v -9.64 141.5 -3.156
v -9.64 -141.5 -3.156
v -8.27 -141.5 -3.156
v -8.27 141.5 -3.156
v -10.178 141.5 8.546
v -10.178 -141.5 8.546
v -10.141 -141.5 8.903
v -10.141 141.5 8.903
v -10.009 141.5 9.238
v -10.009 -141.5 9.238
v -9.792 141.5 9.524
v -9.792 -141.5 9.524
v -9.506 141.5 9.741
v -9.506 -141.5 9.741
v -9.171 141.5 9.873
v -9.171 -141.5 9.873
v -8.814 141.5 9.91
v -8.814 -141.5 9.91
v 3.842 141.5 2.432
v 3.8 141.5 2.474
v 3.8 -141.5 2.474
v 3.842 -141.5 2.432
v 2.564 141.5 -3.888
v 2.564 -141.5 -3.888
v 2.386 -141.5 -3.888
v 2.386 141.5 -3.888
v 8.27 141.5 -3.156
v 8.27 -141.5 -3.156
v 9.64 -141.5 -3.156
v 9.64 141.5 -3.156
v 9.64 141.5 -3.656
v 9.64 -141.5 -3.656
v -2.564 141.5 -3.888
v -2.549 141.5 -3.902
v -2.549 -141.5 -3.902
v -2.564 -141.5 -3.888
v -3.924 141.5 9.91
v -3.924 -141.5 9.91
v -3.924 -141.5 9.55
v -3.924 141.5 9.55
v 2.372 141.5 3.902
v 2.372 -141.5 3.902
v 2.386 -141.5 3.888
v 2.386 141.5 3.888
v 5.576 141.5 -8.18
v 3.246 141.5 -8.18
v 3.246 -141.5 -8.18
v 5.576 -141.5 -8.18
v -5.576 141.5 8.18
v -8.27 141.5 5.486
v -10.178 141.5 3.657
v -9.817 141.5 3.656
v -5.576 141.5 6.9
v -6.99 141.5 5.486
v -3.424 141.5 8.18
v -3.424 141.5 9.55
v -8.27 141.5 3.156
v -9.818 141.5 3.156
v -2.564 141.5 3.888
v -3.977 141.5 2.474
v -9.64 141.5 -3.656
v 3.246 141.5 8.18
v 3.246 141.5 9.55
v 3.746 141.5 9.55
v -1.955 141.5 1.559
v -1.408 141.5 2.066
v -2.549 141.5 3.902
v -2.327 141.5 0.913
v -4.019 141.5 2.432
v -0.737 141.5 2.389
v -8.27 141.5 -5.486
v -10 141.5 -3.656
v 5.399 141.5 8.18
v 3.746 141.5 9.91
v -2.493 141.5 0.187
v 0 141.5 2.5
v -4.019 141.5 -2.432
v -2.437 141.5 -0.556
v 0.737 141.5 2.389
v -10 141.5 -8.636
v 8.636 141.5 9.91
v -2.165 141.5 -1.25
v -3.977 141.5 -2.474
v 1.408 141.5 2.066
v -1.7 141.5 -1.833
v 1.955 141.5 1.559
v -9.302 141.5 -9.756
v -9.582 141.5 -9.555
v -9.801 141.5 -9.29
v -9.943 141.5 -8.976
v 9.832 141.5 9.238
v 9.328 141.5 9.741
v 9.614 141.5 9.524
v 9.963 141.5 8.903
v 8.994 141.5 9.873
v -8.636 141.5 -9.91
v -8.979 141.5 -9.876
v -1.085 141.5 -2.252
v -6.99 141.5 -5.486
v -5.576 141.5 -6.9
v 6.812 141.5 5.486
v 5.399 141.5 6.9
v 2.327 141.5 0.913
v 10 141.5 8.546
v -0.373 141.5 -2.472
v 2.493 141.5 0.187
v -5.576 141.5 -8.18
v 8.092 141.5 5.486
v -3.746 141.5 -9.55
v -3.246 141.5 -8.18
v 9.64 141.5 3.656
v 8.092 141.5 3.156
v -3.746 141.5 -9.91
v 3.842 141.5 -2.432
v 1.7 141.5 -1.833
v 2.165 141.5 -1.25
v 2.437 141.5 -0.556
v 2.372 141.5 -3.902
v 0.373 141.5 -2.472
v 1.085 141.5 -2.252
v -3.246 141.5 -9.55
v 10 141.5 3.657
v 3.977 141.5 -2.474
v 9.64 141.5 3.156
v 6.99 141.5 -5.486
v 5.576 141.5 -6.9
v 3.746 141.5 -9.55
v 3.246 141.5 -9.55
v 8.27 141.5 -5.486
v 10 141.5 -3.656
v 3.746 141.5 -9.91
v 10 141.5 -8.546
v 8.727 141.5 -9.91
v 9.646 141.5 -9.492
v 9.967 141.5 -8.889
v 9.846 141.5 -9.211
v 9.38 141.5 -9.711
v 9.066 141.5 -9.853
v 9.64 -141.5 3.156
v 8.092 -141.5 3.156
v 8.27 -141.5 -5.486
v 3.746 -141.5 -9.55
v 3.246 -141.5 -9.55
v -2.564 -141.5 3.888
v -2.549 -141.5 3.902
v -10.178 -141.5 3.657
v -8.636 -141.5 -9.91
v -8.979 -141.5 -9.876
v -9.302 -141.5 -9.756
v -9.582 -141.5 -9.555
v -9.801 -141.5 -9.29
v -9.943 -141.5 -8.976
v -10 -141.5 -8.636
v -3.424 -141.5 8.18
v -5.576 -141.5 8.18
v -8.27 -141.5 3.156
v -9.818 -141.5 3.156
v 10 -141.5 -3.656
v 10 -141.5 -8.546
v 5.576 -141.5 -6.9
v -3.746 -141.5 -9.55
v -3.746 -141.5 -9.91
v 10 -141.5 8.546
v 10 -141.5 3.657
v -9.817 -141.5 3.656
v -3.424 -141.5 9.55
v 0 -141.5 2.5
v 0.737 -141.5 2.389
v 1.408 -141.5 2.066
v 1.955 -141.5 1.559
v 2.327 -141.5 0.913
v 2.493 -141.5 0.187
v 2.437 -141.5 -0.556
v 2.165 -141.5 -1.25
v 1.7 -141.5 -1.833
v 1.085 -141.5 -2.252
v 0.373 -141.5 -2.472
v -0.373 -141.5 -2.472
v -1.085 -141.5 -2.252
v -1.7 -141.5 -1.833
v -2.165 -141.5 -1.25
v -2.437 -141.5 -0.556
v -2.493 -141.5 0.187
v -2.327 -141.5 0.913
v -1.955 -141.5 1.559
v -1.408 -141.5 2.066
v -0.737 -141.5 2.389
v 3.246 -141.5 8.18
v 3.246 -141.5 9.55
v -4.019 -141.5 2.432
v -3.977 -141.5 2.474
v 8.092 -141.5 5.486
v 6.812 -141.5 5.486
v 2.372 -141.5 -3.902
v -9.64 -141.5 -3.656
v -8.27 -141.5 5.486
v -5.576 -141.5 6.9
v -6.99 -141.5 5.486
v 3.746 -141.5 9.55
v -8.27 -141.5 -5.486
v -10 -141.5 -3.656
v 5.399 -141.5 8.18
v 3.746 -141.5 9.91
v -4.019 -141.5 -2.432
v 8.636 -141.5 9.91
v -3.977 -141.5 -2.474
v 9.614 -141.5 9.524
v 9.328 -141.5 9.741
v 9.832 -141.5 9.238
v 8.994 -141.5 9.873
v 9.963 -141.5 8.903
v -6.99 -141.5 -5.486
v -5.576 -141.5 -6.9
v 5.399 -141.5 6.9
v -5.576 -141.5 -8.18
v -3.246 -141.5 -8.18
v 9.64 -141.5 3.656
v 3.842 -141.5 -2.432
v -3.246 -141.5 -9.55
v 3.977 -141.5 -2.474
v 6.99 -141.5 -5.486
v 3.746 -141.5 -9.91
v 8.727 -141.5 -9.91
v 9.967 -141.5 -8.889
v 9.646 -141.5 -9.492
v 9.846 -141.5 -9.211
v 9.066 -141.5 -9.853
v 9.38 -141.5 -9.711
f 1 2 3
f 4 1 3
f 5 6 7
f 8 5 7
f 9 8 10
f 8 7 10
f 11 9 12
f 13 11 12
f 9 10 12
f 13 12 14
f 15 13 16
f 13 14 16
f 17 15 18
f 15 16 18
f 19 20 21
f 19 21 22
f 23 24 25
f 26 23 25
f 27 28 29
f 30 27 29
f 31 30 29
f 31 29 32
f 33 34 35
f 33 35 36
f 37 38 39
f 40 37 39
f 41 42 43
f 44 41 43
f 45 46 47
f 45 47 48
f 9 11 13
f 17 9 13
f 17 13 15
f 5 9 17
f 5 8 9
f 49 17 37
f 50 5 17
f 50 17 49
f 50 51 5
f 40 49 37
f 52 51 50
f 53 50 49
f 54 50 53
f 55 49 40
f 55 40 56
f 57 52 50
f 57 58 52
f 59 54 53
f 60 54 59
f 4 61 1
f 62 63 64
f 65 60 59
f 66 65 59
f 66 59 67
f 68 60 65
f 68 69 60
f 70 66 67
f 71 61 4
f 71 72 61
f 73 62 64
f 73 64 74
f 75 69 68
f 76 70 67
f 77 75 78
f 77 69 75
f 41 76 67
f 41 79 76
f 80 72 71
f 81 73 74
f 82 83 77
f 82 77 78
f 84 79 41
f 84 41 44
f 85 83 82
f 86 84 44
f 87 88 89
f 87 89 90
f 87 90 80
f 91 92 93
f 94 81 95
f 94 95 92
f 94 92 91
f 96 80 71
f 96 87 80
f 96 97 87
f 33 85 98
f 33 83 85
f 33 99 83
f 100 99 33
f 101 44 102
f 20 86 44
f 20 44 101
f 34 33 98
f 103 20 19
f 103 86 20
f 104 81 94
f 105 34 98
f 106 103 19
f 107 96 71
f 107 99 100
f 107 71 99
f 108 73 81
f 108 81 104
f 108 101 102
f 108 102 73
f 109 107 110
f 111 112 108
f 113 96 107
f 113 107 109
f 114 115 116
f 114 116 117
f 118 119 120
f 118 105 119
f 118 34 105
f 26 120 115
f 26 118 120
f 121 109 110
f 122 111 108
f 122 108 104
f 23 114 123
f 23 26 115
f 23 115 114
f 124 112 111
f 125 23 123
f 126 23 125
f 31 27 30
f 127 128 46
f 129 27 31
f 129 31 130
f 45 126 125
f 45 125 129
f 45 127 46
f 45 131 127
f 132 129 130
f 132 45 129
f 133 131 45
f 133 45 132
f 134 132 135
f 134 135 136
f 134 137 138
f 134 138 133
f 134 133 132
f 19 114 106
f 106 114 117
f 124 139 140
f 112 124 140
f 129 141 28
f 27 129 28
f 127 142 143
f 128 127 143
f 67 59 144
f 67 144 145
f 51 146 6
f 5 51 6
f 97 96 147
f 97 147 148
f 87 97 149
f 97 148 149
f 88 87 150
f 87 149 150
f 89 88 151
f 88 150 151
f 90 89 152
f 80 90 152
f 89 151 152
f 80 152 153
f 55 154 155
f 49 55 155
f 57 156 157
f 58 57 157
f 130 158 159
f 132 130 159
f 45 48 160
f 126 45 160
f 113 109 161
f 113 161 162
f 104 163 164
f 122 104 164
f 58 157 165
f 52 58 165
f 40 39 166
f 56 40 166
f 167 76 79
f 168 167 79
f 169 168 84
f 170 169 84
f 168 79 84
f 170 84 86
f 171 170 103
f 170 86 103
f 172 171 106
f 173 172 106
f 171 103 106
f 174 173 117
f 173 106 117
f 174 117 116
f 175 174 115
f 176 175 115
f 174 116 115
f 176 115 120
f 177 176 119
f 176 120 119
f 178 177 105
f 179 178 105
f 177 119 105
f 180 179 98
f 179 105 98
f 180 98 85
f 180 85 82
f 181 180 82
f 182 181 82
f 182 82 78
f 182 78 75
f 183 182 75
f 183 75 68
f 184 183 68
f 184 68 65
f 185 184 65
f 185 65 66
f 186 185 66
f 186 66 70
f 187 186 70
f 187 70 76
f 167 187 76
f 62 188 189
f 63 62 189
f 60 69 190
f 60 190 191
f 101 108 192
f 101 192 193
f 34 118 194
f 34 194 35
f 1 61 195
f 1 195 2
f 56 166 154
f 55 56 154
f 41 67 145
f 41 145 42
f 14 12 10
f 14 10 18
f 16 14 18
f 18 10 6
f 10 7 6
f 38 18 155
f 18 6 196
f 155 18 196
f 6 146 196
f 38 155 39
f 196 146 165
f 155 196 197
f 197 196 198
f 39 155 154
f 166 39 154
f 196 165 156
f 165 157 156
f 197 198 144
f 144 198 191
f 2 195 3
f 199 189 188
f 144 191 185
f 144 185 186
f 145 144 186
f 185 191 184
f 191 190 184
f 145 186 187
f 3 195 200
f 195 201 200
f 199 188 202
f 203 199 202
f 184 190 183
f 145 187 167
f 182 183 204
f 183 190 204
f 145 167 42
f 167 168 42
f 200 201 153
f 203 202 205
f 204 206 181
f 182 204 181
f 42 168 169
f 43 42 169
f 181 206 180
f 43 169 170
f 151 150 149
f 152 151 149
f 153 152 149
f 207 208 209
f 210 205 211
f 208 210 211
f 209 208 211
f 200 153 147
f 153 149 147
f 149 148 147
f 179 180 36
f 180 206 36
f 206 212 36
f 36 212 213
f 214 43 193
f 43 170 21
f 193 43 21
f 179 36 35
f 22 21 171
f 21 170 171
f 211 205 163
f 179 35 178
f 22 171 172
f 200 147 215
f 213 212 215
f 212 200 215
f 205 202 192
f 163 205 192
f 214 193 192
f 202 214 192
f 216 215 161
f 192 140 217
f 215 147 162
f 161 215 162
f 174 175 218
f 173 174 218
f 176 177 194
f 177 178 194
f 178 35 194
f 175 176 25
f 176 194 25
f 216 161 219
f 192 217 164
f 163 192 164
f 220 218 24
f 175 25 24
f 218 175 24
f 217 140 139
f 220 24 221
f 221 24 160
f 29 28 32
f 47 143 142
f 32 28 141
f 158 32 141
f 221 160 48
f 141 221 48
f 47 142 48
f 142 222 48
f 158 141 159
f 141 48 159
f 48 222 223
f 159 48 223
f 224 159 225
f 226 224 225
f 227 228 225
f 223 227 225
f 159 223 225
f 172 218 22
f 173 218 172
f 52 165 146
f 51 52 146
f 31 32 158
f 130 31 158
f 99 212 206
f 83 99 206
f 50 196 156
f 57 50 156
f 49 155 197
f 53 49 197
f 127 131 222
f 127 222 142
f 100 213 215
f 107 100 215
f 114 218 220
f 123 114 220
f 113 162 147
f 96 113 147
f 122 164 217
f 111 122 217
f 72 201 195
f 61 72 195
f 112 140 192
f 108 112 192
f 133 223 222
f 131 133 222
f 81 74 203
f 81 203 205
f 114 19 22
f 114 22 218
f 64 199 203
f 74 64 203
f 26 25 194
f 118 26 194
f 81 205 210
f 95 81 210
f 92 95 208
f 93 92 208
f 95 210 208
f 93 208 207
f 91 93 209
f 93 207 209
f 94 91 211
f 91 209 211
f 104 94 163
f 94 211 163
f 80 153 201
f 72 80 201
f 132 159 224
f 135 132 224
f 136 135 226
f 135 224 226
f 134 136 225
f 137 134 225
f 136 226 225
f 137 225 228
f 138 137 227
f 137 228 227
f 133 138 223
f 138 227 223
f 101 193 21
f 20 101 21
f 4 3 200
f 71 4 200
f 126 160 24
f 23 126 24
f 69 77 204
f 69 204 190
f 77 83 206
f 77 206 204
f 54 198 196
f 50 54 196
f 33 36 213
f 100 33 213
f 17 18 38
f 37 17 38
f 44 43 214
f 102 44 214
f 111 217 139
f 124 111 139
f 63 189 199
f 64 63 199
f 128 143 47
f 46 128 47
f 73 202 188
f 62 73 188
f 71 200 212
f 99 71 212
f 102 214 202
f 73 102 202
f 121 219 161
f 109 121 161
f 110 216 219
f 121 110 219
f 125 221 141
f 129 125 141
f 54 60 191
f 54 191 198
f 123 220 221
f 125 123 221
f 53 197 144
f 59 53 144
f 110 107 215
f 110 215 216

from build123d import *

# Parameters (mm, degrees)
SALIENTE_EXTRUIR1_START = -141.5
SALIENTE_EXTRUIR1_DEPTH = 283
CROQUIS2_R              = 2.5
CORTAR_EXTRUIR1_DEPTH   = 284.356342905


# Read off the part's stored shape, not the designer's step: Saliente-Extruir1
with BuildPart() as part:
    # Saliente-Extruir1 outline → Saliente-Extruir1 (new body)
    with BuildSketch(Plane(origin=(0, 0, 0), x_dir=(1, 0, 0), z_dir=(0, 1, 0)).offset(SALIENTE_EXTRUIR1_START)):
        with BuildLine():
            ThreePointArc((8.636410676, -9.909743891), (9.614405544, -9.524074441), (10, -8.546050003))
            Line((10, -8.546050003), (10, -3.656511811))
            Line((10, -3.656511811), (9.639909344, -3.656484199))
            Line((9.639909344, -3.656484199), (9.639947683, -3.156497817))
            Line((9.639947683, -3.156497817), (8.092374533, -3.156379149))
            Line((8.092374533, -3.156379149), (8.092195869, -5.486379142))
            Line((8.092195869, -5.486379142), (6.812195872, -5.486280992))
            Line((6.812195872, -5.486280992), (3.799920985, -2.474006104))
            Line((3.799920985, -2.474006104), (3.841542046, -2.432385043))
            Line((3.841542046, -2.432385043), (3.841542046, 2.432385043))
            Line((3.841542046, 2.432385043), (3.97749414, 2.474006104))
            Line((3.97749414, 2.474006104), (6.99, 5.486050003))
            Line((6.99, 5.486050003), (8.27, 5.486050003))
            Line((8.27, 5.486050003), (8.27, 3.156050003))
            Line((8.27, 3.156050003), (9.64, 3.156050003))
            Line((9.64, 3.156050003), (9.64, 3.656050003))
            Line((9.64, 3.656050003), (10, 3.656050003))
            Line((10, 3.656050003), (10, 8.546050003))
            ThreePointArc((10, 8.546050003), (9.645746662, 9.491640567), (8.726602194, 9.909743891))
            Line((8.726602194, 9.909743891), (3.746410661, 9.909743891))
            Line((3.746410661, 9.909743891), (3.746383085, 9.550118856))
            Line((3.746383085, 9.550118856), (3.246383087, 9.550157196))
            Line((3.246383087, 9.550157196), (3.246278035, 8.1801572))
            Line((3.246278035, 8.1801572), (5.576278029, 8.179978536))
            Line((5.576278029, 8.179978536), (5.576179878, 6.89997854))
            Line((5.576179878, 6.89997854), (2.563904991, 3.887703652))
            Line((2.563904991, 3.887703652), (2.386331835, 3.887703652))
            Line((2.386331835, 3.887703652), (2.371542046, 3.902385043))
            Line((2.371542046, 3.902385043), (-2.549115201, 3.902385043))
            Line((-2.549115201, 3.902385043), (-2.563904991, 3.887703652))
            Line((-2.563904991, 3.887703652), (-5.576179878, 6.89997854))
            Line((-5.576179878, 6.89997854), (-5.576278029, 8.179978536))
            Line((-5.576278029, 8.179978536), (-3.246278035, 8.1801572))
            Line((-3.246278035, 8.1801572), (-3.246383087, 9.550157196))
            Line((-3.246383087, 9.550157196), (-3.746383085, 9.550118856))
            Line((-3.746383085, 9.550118856), (-3.746410661, 9.909743891))
            Line((-3.746410661, 9.909743891), (-8.636410676, 9.909743891))
            ThreePointArc((-8.636410676, 9.909743891), (-9.581900138, 9.555487091), (-10, 8.636443724))
            Line((-10, 8.636443724), (-10, 3.656050003))
            Line((-10, 3.656050003), (-9.64, 3.656050003))
            Line((-9.64, 3.656050003), (-9.64, 3.156050003))
            Line((-9.64, 3.156050003), (-8.27, 3.156050003))
            Line((-8.27, 3.156050003), (-8.27, 5.486050003))
            Line((-8.27, 5.486050003), (-6.99, 5.486050003))
            Line((-6.99, 5.486050003), (-3.97749414, 2.474006104))
            Line((-3.97749414, 2.474006104), (-4.019115201, 2.432385043))
            Line((-4.019115201, 2.432385043), (-4.019115201, -2.432385043))
            Line((-4.019115201, -2.432385043), (-3.97749414, -2.474006104))
            Line((-3.97749414, -2.474006104), (-6.989769028, -5.486280992))
            Line((-6.989769028, -5.486280992), (-8.269769024, -5.486379142))
            Line((-8.269769024, -5.486379142), (-8.269947688, -3.156379149))
            Line((-8.269947688, -3.156379149), (-9.817520839, -3.156497817))
            Line((-9.817520839, -3.156497817), (-9.8174825, -3.656484199))
            Line((-9.8174825, -3.656484199), (-10.177573156, -3.656511811))
            Line((-10.177573156, -3.656511811), (-10.177573156, -8.546050003))
            ThreePointArc((-10.177573156, -8.546050003), (-9.7919787, -9.524074441), (-8.813983831, -9.909743891))
            Line((-8.813983831, -9.909743891), (-3.923983846, -9.910118855))
            Line((-3.923983846, -9.910118855), (-3.923956241, -9.550118856))
            Line((-3.923956241, -9.550118856), (-3.423956243, -9.550157196))
            Line((-3.423956243, -9.550157196), (-3.423851191, -8.1801572))
            Line((-3.423851191, -8.1801572), (-5.57627803, -8.179992152))
            Line((-5.57627803, -8.179992152), (-5.576179878, -6.89997854))
            Line((-5.576179878, -6.89997854), (-2.563904991, -3.887703652))
            Line((-2.563904991, -3.887703652), (-2.549115201, -3.902385043))
            Line((-2.549115201, -3.902385043), (2.371542046, -3.902385043))
            Line((2.371542046, -3.902385043), (2.386331835, -3.887703652))
            Line((2.386331835, -3.887703652), (5.398606723, -6.89997854))
            Line((5.398606723, -6.89997854), (5.398704874, -8.179992152))
            Line((5.398704874, -8.179992152), (3.246278035, -8.1801572))
            Line((3.246278035, -8.1801572), (3.246383087, -9.550157196))
            Line((3.246383087, -9.550157196), (3.746383085, -9.550118856))
            Line((3.746383085, -9.550118856), (3.74641069, -9.910118855))
            Line((3.74641069, -9.910118855), (8.636410676, -9.909743891))
        make_face()
    extrude(amount=SALIENTE_EXTRUIR1_DEPTH)

    # Croquis2 → Cortar-Extruir1 (cut, through all)
    with BuildSketch(Plane(origin=(0, 141.5, 0), x_dir=(1, 0, 0), z_dir=(0, 1, 0))):
        with Locations(Location((0, 0, 0), (0, 0, 270))):
            Circle(CROQUIS2_R)
    extrude(amount=-CORTAR_EXTRUIR1_DEPTH, mode=Mode.SUBTRACT)


solid = part.part
